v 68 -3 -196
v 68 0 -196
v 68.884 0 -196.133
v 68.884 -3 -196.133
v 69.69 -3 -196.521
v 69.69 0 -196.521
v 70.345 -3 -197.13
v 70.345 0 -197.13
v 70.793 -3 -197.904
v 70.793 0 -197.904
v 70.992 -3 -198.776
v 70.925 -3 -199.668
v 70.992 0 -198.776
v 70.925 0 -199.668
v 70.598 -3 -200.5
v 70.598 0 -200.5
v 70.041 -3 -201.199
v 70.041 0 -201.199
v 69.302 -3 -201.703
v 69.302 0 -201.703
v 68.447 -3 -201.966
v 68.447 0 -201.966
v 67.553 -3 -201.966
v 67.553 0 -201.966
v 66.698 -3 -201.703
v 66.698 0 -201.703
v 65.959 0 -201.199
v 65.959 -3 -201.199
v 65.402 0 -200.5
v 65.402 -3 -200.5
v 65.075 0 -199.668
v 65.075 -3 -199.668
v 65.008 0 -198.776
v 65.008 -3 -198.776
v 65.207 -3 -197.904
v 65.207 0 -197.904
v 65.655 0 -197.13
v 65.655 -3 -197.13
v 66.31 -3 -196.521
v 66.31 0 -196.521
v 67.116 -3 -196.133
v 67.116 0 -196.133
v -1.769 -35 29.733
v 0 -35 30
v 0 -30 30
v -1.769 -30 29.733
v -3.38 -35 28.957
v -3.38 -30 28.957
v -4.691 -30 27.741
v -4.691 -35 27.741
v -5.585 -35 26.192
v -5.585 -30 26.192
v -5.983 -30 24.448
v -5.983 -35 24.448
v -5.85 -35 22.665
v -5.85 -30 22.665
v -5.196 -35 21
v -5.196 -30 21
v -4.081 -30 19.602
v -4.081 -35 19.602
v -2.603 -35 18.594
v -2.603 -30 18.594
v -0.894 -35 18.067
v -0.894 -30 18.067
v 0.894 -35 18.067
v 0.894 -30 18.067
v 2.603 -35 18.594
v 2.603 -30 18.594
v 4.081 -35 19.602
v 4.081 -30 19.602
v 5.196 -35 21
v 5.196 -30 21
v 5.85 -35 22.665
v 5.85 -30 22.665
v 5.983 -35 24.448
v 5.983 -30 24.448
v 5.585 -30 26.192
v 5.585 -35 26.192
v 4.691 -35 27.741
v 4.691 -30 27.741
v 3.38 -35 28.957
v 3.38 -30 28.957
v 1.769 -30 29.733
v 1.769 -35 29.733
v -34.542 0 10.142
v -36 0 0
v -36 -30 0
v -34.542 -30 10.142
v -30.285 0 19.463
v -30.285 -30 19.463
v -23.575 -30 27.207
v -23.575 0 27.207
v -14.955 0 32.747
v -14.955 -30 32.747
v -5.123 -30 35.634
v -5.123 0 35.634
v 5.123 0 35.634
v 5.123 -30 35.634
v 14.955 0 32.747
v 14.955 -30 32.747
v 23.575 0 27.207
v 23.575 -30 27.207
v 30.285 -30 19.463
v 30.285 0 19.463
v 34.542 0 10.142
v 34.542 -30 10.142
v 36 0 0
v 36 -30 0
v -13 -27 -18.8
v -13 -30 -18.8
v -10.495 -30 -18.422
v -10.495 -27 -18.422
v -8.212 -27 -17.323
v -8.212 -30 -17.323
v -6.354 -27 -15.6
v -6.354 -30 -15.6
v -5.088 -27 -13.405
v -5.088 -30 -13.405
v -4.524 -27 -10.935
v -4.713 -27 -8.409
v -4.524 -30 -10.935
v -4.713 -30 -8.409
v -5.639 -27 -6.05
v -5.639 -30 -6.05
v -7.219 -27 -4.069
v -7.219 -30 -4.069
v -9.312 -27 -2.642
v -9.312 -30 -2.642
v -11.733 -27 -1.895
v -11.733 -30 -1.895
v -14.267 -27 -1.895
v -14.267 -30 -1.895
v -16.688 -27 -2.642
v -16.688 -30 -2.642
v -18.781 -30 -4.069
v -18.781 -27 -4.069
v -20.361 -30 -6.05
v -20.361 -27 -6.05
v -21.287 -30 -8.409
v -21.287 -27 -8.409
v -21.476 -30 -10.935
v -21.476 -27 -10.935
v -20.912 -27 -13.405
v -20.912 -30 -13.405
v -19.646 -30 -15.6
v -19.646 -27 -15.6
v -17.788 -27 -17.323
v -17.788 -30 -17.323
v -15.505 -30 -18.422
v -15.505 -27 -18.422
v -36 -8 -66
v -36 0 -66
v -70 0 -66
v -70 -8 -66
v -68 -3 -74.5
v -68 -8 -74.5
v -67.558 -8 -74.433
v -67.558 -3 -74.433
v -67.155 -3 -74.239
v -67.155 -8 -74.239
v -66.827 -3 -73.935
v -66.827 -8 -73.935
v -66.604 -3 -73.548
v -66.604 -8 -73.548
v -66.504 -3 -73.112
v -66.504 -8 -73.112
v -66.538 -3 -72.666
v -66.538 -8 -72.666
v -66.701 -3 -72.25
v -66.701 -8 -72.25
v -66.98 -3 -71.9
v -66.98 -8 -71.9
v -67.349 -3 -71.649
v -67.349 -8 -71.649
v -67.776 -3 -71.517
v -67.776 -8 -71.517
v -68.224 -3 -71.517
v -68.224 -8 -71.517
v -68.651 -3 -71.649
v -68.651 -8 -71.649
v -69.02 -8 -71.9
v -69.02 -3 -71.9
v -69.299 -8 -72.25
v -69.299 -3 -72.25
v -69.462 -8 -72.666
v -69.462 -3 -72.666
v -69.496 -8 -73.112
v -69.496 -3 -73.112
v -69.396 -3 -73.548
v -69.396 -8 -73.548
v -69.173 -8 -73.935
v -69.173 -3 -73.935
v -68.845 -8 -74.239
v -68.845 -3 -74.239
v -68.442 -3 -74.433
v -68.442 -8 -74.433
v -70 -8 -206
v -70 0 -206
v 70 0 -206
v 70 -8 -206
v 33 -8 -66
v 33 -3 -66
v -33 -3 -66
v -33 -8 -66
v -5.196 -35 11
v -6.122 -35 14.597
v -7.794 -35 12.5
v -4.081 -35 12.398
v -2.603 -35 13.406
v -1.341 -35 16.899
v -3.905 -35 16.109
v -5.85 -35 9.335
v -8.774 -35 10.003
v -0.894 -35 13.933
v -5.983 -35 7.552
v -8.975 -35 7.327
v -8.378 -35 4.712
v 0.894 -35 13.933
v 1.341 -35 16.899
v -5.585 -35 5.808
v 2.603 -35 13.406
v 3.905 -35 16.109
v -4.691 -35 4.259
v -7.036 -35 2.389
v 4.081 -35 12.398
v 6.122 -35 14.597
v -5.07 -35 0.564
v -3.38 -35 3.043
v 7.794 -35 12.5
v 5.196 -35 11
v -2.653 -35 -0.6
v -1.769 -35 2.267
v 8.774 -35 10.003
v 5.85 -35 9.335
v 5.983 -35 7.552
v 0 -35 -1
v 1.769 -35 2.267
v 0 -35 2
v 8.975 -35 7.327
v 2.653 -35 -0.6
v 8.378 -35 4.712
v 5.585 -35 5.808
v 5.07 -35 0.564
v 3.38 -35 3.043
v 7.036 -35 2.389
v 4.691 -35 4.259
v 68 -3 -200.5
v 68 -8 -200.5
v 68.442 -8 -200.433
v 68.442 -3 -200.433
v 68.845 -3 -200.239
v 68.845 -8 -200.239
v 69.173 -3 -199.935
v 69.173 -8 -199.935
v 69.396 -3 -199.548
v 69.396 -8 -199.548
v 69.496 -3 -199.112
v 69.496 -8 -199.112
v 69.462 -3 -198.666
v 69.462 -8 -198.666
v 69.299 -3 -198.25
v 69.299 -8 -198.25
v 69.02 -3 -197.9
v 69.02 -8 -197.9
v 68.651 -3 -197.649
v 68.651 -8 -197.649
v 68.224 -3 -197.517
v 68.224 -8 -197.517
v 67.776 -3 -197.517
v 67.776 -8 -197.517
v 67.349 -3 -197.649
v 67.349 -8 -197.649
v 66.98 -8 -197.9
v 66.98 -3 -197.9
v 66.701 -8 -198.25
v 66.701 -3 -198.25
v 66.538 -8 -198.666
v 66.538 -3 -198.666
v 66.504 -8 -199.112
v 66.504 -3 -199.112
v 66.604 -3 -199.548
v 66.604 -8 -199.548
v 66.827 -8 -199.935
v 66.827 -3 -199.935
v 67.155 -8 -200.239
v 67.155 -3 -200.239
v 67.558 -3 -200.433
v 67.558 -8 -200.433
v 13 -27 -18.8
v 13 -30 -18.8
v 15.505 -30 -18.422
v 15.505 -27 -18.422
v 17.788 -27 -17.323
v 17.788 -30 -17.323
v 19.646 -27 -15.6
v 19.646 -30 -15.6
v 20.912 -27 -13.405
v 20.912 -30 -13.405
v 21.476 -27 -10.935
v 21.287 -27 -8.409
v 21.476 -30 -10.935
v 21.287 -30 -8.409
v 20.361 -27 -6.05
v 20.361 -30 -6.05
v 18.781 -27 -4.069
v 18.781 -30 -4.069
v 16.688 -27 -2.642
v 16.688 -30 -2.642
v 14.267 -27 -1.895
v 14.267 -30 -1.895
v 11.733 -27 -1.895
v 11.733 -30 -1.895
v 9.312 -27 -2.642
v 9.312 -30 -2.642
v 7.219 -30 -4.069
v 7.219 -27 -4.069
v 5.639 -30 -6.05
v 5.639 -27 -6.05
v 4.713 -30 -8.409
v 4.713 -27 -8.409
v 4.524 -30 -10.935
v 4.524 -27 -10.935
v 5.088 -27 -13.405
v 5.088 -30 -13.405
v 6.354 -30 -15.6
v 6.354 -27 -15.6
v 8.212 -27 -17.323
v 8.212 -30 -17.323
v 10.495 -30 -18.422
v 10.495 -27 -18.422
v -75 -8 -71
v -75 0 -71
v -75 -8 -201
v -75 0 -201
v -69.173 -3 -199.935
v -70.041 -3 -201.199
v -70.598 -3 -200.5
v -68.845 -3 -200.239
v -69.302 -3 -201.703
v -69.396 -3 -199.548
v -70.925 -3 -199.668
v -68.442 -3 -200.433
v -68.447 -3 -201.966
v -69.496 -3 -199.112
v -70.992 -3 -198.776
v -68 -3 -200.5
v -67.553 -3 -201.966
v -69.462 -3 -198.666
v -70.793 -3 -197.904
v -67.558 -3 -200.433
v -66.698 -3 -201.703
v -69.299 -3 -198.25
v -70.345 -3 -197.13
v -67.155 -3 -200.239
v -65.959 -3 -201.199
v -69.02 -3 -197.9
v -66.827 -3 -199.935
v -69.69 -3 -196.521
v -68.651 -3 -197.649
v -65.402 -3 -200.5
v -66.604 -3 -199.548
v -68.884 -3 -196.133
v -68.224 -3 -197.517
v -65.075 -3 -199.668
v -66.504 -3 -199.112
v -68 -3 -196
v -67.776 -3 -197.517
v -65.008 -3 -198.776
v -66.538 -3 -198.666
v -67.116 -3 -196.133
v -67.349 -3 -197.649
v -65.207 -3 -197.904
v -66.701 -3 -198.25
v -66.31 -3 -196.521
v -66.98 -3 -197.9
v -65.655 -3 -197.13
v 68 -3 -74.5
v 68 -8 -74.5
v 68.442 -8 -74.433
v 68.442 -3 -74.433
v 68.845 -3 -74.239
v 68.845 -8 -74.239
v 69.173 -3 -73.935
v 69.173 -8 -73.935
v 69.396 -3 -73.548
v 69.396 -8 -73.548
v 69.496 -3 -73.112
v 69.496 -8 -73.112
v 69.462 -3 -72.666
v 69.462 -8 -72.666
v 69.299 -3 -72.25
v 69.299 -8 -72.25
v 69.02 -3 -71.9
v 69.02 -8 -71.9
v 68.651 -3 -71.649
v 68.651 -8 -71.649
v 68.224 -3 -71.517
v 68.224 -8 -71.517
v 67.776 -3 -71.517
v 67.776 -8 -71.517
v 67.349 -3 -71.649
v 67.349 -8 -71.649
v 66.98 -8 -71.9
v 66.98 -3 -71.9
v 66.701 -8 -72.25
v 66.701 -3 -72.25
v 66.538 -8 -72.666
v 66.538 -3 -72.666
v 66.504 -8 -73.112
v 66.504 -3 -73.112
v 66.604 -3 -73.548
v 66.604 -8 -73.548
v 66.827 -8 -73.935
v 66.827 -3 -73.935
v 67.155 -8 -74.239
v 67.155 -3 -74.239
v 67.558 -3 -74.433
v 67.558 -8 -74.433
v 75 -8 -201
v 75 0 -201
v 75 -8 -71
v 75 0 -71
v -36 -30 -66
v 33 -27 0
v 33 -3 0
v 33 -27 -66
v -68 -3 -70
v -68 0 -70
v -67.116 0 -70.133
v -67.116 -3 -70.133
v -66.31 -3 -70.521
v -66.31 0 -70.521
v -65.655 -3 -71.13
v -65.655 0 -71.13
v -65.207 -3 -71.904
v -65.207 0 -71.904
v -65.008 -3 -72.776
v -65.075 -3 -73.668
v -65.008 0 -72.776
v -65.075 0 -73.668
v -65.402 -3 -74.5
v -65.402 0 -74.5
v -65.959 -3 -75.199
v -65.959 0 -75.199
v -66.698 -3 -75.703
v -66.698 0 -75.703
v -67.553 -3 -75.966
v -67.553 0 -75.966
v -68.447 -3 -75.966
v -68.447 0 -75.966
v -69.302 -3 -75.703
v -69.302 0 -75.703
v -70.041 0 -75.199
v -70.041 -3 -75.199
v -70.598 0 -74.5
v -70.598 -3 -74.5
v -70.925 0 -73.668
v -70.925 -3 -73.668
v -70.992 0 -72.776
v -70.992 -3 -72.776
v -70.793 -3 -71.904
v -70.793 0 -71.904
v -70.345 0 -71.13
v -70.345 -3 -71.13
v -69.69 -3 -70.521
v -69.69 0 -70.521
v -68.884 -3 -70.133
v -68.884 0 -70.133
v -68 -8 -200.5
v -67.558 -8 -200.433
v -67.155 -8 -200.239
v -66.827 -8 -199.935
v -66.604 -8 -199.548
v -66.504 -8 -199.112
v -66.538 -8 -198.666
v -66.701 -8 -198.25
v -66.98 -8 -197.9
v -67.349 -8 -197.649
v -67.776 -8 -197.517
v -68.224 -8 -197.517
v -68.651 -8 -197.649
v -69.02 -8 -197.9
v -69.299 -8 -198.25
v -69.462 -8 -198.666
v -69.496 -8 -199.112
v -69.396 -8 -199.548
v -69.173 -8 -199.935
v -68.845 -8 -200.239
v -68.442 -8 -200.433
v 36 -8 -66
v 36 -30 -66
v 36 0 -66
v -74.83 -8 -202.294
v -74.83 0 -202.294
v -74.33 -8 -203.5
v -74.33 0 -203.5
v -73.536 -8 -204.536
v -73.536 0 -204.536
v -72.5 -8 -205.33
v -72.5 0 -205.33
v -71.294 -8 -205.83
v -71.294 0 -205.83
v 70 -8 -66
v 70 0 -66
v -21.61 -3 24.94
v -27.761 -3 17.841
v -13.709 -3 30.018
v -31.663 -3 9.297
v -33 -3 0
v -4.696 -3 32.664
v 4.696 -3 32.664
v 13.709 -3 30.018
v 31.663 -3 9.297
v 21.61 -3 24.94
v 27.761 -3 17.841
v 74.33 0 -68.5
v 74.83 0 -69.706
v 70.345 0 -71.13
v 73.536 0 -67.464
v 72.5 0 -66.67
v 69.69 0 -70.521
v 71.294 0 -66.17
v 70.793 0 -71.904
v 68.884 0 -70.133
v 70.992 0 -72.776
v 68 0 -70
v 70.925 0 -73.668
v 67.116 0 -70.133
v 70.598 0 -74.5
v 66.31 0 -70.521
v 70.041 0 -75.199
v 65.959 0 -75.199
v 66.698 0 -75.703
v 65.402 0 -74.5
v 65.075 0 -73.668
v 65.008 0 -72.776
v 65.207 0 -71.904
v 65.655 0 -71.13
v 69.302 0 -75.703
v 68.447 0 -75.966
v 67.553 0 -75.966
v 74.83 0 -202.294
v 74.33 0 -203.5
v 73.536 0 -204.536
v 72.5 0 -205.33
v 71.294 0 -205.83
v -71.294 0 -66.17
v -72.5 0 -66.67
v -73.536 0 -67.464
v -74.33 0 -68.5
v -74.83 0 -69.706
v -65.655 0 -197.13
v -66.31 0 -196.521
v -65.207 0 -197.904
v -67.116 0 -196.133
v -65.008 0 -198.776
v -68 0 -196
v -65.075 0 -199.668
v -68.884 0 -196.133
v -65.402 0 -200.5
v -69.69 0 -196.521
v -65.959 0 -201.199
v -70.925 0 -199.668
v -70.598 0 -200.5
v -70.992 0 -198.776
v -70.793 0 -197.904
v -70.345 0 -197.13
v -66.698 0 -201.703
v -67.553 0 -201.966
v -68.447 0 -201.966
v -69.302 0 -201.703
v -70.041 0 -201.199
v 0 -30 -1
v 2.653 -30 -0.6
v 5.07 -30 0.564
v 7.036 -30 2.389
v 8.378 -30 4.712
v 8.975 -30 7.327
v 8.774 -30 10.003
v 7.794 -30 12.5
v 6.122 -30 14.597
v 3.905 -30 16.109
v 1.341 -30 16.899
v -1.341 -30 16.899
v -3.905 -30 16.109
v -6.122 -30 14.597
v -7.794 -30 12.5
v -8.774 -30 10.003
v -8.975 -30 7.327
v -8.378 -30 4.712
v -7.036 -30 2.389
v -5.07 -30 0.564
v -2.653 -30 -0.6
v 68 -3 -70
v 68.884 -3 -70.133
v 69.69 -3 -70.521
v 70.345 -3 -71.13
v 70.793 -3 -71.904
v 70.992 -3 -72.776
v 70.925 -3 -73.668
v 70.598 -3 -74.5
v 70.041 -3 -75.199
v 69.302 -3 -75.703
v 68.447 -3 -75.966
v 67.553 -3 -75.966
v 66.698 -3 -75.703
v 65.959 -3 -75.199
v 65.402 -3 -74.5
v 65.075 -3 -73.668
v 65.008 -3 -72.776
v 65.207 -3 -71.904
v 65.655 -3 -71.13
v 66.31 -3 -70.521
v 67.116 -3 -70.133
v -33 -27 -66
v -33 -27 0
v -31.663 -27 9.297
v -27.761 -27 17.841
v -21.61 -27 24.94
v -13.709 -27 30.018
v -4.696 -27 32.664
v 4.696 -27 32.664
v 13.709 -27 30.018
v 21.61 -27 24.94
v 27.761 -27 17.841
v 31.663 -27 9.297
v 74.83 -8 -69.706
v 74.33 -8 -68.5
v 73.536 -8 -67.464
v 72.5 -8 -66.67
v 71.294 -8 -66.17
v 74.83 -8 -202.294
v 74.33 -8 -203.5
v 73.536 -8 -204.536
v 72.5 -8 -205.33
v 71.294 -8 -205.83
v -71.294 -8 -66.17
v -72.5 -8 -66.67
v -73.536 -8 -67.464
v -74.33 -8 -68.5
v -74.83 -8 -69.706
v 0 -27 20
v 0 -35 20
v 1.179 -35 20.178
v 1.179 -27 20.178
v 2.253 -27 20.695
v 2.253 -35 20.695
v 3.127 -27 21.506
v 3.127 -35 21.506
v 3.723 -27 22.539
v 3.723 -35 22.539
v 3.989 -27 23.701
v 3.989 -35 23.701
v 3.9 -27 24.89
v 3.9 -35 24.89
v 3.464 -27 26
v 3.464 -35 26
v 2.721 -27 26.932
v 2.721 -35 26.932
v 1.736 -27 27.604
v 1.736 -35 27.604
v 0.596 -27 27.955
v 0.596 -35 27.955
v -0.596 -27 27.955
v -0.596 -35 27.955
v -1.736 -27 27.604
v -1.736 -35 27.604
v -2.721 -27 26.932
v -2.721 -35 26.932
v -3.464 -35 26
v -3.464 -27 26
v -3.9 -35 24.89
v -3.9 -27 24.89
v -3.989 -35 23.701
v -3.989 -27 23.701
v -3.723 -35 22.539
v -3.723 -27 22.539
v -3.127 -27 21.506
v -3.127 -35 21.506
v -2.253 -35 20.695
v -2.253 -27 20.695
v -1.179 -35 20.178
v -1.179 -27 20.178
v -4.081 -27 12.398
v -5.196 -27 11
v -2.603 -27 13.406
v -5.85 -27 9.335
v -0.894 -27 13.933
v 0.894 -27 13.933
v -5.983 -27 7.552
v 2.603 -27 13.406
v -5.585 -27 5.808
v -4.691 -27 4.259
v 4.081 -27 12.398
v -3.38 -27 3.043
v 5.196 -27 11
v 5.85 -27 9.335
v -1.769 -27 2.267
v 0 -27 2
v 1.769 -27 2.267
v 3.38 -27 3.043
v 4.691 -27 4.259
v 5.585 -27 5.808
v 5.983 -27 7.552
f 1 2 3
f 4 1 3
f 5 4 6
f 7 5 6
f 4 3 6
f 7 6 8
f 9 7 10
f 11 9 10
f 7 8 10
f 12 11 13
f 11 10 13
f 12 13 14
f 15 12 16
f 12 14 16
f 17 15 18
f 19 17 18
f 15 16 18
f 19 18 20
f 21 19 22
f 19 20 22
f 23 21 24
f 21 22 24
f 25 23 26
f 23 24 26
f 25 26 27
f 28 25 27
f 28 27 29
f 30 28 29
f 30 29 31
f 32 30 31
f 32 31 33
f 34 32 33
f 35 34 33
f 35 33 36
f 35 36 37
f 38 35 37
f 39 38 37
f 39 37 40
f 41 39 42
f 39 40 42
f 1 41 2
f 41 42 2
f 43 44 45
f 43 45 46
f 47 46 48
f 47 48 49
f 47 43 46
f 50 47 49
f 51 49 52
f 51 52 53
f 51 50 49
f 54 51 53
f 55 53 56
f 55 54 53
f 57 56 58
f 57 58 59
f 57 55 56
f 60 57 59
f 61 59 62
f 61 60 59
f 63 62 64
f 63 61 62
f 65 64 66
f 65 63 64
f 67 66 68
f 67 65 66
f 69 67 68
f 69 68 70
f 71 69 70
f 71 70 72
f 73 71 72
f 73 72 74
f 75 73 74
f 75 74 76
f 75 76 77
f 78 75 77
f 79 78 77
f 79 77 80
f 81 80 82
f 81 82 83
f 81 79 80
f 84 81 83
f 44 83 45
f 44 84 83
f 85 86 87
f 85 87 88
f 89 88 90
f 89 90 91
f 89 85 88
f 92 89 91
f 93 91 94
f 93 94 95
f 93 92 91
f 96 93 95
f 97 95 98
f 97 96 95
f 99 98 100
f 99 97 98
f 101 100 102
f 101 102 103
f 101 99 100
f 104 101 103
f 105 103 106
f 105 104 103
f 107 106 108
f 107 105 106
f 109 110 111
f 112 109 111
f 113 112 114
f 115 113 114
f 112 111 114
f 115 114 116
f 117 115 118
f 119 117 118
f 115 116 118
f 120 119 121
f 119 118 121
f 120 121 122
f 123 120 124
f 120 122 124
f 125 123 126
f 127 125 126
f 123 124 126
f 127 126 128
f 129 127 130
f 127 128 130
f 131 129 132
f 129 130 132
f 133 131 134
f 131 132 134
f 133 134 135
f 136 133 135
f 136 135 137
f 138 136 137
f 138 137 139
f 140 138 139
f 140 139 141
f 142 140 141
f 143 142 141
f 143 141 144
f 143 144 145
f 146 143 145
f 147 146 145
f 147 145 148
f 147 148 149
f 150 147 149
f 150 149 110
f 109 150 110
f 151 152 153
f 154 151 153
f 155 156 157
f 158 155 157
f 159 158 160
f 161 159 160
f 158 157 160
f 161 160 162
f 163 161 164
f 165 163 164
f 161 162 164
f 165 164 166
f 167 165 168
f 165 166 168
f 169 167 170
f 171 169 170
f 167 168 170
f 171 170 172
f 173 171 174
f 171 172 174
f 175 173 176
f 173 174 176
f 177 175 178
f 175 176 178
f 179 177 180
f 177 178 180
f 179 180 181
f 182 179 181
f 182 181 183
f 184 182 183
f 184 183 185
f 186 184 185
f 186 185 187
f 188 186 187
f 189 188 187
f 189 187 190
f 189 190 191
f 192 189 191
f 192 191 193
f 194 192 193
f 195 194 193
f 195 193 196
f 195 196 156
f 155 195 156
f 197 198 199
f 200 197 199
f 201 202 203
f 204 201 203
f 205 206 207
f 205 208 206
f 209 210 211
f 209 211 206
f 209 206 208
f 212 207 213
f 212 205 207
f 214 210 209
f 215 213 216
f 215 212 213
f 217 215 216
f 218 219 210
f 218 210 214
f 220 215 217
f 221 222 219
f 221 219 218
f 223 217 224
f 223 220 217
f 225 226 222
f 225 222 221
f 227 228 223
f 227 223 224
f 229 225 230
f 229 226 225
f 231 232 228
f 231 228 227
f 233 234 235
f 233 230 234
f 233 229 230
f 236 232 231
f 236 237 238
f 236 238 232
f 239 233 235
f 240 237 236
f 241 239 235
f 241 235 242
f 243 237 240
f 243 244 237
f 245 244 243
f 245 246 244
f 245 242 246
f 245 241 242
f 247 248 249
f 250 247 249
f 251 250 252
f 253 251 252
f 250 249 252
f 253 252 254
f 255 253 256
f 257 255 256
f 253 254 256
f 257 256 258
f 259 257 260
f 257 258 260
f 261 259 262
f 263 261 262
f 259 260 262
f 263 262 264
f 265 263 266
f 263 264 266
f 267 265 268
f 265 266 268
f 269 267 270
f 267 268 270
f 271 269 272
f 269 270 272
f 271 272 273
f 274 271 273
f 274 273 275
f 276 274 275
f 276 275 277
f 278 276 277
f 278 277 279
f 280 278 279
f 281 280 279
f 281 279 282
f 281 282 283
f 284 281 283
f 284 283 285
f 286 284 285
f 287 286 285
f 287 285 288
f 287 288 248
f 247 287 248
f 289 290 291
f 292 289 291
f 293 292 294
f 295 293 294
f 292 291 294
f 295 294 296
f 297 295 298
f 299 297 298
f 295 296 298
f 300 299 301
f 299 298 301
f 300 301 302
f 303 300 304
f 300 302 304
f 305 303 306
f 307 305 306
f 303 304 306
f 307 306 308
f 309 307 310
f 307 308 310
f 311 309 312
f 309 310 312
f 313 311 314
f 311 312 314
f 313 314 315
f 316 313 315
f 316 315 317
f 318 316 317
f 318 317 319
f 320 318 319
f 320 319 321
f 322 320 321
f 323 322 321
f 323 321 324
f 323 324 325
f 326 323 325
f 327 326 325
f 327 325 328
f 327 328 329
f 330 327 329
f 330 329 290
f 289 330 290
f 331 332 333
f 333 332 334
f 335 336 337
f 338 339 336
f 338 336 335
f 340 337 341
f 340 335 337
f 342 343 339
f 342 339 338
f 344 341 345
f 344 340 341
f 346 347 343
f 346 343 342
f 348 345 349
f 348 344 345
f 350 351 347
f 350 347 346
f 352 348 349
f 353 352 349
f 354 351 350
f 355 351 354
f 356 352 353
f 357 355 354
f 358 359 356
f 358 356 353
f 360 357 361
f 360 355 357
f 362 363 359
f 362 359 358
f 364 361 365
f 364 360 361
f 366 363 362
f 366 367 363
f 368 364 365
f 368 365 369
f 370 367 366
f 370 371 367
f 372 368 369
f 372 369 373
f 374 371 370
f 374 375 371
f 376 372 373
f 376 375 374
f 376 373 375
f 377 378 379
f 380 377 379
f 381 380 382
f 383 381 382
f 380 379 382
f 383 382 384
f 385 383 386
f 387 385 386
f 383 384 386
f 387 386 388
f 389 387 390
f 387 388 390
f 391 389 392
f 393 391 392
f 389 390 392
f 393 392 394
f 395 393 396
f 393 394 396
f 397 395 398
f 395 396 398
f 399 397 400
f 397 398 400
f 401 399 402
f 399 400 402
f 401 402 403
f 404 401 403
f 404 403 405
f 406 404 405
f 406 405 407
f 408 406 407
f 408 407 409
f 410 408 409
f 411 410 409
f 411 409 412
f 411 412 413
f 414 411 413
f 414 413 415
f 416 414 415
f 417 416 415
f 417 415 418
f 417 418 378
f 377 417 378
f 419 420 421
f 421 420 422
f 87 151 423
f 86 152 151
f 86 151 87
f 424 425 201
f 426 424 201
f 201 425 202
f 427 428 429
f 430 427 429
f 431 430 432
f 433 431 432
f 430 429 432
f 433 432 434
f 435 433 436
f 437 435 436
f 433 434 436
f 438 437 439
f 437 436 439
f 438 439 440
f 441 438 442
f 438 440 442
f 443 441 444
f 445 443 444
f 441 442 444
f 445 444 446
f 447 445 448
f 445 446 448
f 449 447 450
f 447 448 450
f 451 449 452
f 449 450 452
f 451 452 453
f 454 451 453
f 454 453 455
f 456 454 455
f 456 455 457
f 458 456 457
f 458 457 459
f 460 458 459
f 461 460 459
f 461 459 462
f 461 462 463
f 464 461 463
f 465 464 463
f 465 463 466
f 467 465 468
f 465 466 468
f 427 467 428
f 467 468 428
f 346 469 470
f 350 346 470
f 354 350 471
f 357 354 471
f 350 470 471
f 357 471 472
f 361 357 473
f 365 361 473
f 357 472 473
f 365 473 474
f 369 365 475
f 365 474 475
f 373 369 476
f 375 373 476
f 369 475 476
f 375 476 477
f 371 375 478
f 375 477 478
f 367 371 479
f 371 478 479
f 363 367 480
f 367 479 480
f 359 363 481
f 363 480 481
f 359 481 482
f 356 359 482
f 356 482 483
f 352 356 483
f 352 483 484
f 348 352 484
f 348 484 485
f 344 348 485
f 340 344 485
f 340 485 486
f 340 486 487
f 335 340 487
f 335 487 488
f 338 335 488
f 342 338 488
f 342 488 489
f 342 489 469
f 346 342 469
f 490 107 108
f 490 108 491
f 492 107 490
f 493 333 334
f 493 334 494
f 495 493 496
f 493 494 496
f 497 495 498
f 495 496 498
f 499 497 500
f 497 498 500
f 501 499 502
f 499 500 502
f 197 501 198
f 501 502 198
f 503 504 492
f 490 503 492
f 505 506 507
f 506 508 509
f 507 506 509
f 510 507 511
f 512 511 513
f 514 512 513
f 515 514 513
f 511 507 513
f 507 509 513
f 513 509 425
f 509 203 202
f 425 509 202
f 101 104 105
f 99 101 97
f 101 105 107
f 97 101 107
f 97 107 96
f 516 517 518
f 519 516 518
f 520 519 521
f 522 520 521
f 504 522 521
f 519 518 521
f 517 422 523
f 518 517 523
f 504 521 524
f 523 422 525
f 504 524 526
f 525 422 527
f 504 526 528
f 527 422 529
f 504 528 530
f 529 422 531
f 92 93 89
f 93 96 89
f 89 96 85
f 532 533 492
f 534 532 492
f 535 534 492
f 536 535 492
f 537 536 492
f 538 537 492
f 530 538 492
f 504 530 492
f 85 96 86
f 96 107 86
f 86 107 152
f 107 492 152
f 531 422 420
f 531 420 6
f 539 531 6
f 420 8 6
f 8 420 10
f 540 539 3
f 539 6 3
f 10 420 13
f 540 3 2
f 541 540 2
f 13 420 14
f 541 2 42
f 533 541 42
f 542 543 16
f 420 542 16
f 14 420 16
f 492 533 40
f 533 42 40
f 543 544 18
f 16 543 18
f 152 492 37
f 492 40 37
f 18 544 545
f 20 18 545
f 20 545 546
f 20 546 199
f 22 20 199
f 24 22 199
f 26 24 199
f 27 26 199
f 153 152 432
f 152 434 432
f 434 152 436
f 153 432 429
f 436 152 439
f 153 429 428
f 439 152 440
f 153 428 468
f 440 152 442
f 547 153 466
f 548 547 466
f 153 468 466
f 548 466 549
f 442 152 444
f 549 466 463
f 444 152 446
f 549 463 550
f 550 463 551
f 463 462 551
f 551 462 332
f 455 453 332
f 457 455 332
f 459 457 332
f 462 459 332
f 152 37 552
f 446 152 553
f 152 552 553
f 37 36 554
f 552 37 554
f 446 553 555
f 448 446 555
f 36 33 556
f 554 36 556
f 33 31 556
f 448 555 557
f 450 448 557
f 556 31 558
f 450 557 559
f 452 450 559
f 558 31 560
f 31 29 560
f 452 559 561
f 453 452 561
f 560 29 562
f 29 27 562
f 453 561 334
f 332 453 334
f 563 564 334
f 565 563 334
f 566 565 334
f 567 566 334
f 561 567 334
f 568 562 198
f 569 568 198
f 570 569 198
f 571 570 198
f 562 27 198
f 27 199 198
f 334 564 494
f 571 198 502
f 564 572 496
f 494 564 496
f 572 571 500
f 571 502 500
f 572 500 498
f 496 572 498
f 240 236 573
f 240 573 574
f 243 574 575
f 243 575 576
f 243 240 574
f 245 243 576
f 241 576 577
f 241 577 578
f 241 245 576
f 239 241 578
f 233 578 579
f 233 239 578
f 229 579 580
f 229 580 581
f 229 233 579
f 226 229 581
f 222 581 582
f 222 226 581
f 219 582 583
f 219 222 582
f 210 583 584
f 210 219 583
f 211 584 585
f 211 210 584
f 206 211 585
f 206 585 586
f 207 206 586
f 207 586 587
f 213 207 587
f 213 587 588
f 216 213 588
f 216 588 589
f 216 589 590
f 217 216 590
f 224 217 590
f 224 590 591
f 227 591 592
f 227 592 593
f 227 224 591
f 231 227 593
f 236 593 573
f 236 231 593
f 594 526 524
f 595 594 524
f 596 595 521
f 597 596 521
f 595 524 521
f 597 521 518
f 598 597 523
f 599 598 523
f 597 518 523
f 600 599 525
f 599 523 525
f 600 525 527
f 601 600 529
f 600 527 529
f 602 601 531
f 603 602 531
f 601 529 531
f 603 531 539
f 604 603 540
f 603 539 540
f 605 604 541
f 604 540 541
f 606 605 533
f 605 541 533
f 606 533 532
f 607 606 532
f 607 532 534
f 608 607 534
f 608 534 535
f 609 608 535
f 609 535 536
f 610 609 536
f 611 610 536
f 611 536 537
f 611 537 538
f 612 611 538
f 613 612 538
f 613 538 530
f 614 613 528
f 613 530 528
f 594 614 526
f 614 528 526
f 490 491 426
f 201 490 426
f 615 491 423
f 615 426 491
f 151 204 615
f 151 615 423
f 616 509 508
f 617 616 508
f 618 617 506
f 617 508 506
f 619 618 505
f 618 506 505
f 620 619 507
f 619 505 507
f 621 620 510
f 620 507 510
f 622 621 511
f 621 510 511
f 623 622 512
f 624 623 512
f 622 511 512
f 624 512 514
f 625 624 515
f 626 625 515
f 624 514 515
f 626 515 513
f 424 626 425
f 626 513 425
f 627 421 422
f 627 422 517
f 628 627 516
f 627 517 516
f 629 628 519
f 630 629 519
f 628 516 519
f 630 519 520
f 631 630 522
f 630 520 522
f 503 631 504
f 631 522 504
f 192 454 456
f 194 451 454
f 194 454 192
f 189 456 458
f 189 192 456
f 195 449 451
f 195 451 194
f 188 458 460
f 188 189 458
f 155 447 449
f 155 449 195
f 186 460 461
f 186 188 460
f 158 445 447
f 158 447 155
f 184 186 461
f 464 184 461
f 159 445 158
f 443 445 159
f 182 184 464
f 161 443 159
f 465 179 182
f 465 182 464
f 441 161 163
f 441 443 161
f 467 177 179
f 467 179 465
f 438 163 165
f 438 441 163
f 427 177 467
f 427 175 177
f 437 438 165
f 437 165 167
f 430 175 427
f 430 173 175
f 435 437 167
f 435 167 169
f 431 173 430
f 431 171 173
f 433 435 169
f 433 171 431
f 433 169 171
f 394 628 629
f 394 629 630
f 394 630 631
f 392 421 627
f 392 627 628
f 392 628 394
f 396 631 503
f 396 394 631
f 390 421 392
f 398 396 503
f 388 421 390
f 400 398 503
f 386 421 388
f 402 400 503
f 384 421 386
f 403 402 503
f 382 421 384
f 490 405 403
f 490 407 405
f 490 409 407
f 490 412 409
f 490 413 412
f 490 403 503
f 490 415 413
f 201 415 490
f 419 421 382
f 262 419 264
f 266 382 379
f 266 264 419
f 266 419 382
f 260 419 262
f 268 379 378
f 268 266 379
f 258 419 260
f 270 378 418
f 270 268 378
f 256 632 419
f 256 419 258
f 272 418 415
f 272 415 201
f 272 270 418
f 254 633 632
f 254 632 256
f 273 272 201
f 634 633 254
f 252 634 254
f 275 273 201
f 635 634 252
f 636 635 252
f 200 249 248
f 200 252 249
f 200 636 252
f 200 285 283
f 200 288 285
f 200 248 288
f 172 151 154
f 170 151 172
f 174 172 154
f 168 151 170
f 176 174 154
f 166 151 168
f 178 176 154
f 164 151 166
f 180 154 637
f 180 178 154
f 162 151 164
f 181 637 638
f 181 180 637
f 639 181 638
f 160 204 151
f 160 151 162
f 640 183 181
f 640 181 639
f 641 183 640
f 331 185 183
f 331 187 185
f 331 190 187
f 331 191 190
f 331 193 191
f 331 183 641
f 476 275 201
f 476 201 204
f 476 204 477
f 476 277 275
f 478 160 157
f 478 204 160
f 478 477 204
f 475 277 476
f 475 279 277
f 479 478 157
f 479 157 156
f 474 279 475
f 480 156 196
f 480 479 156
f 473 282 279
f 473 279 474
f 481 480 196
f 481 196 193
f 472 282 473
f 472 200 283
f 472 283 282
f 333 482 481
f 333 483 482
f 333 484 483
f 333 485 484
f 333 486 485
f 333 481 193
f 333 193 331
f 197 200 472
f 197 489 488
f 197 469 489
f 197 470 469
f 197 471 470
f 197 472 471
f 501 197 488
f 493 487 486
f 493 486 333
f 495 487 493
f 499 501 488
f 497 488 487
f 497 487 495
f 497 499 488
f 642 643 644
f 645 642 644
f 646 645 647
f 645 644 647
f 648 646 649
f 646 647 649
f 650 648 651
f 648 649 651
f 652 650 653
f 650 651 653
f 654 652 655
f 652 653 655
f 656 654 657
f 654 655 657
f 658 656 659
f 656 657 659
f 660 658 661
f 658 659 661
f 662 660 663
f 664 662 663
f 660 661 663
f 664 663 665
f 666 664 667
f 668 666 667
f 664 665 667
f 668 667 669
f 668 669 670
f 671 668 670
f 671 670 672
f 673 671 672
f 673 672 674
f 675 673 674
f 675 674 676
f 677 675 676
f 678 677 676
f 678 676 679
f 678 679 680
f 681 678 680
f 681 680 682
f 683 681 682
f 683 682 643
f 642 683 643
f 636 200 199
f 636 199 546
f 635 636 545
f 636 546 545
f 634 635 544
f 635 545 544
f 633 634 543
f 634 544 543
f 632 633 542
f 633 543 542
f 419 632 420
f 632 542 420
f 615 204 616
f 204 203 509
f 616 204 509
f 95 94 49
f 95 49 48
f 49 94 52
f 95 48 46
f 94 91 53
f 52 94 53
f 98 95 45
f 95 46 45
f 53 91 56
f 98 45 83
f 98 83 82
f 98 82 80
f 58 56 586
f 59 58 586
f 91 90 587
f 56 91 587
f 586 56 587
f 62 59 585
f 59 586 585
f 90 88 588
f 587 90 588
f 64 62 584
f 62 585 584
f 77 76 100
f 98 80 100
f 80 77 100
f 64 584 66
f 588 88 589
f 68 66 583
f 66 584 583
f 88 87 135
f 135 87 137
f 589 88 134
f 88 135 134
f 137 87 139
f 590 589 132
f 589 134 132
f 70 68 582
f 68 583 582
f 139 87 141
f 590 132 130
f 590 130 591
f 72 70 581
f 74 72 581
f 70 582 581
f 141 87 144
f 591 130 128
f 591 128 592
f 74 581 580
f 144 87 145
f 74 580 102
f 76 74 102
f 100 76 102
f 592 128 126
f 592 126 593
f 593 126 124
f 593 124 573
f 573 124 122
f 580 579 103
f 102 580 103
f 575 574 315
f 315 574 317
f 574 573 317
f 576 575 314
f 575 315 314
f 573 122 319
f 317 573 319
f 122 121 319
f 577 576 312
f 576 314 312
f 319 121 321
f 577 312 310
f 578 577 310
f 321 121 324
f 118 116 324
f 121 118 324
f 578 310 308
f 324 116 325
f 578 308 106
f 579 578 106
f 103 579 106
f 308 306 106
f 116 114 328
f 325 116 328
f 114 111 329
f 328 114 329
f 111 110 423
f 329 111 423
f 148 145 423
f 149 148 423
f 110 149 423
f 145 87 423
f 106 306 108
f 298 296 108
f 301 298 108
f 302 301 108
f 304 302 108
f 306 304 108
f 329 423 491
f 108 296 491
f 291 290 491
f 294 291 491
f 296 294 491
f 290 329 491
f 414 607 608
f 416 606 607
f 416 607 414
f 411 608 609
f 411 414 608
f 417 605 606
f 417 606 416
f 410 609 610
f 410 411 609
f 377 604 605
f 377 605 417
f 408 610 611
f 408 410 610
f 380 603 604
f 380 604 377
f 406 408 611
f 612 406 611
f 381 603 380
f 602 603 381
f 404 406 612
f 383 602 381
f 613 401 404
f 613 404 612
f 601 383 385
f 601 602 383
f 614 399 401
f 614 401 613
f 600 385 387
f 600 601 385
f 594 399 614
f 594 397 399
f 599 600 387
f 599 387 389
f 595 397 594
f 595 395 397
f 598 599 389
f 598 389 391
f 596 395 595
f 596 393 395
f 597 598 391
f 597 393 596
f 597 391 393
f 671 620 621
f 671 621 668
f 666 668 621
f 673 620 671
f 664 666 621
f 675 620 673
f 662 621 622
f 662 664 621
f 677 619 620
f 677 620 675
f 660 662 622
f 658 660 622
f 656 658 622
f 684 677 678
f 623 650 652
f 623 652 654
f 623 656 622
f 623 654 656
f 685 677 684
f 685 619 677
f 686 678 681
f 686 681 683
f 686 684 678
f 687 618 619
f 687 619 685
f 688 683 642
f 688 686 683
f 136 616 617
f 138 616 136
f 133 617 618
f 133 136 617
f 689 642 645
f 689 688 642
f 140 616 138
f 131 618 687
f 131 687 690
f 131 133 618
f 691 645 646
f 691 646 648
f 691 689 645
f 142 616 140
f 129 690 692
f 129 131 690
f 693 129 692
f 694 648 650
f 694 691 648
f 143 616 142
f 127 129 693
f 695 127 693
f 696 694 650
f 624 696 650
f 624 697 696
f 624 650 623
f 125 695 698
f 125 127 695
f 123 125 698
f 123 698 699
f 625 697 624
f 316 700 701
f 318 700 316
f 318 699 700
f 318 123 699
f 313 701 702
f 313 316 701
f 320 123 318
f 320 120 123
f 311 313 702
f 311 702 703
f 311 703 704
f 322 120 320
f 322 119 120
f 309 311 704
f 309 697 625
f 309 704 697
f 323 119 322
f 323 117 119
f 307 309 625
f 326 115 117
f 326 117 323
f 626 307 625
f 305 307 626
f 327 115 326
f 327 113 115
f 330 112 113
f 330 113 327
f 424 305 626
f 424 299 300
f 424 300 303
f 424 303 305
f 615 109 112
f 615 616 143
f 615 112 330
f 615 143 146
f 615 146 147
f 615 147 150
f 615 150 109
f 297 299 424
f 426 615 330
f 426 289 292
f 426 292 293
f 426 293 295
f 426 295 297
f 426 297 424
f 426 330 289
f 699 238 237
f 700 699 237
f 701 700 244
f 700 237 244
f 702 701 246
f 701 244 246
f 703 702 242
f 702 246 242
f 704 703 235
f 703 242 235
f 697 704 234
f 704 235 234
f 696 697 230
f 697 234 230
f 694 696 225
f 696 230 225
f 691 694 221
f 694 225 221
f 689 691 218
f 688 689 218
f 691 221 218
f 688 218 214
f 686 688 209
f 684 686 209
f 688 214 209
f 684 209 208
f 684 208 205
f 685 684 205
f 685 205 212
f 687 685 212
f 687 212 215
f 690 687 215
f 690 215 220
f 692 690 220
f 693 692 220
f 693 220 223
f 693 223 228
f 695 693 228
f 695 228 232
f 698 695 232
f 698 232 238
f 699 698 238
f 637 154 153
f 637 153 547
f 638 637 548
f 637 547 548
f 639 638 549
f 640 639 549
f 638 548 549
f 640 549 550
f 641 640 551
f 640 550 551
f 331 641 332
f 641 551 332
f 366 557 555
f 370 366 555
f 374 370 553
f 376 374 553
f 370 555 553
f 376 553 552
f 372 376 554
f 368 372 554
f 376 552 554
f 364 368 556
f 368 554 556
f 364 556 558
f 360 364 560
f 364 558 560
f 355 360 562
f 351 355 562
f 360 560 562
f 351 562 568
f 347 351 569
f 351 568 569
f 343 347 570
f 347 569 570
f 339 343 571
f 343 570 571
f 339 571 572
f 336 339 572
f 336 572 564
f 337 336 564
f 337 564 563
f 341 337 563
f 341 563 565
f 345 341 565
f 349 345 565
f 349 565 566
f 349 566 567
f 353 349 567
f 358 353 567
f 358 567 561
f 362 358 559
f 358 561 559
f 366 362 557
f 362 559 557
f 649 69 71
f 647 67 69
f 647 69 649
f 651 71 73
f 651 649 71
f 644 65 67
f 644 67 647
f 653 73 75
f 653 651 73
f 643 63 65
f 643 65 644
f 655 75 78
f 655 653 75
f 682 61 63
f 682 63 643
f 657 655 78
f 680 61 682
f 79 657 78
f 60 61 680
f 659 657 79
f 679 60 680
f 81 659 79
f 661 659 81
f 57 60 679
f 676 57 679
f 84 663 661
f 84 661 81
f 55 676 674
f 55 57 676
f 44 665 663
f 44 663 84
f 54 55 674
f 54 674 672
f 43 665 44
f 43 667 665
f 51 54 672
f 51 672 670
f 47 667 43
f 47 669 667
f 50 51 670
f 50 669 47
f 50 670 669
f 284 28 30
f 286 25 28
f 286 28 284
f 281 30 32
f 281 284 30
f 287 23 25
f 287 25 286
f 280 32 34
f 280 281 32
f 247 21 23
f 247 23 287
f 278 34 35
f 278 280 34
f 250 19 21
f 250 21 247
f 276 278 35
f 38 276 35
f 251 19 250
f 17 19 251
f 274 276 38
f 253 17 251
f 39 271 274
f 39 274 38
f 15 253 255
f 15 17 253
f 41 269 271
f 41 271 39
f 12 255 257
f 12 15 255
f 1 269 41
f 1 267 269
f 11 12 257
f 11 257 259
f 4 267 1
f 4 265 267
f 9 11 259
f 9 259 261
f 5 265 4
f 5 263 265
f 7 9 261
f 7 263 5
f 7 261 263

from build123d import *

# Parameters (mm, degrees)
BOSS_EXTRUDE1_DEPTH = 30
SHELL1_T            = -3
BOSS_EXTRUDE2_DEPTH = 8
SKETCH2_R           = 8.5
CUT_EXTRUDE1_DEPTH  = 6.5
SKETCH5_R           = 6
CUT_EXTRUDE4_DEPTH  = 13
BOSS_EXTRUDE3_START = 5
SKETCH6_R           = 9
SKETCH6_R_2         = 6
BOSS_EXTRUDE3_DEPTH = 5
SKETCH7_R           = 4
CUT_EXTRUDE5_DEPTH  = 7
BOSS_EXTRUDE4_START = 5
SKETCH7_3_R         = 6
SKETCH7_3_R_2       = 4
BOSS_EXTRUDE4_DEPTH = 5
SKETCH8_R           = 1.5
CUT_EXTRUDE6_DEPTH  = 221.884585248
SKETCH9_R           = 3
CUT_EXTRUDE7_DEPTH  = 3


with BuildPart() as part:
    # Sketch1 → Boss-Extrude1 (new body)
    with BuildSketch(Plane(origin=(0, 0, 0), x_dir=(1, 0, 0), z_dir=(0, 1, 0))):
        with BuildLine():
            ThreePointArc((-36, 0), (0, -36), (36, 0))
            Line((36, 0), (36, 66))
            Line((36, 66), (-36, 66))
            Line((-36, 66), (-36, 0))
        make_face()
    extrude(amount=-BOSS_EXTRUDE1_DEPTH)

    # Shell1
    shell1_openings = [part.faces().sort_by_distance(p)[0] for p in [
        (0, -15, -66),
    ]]
    offset(amount=SHELL1_T, openings=shell1_openings, kind=Kind.INTERSECTION)

    # Sketch1<3> → Boss-Extrude2 (add)
    with BuildSketch(Plane(origin=(0, 0, 0), x_dir=(1, 0, 0), z_dir=(0, 1, 0))):
        with BuildLine():
            Line((-36, 66), (36, 66))
            Line((36, 66), (70, 66))
            ThreePointArc((70, 66), (73.535533906, 67.464466094), (75, 71))
            Line((75, 71), (75, 201))
            ThreePointArc((75, 201), (73.535533906, 204.535533906), (70, 206))
            Line((70, 206), (-70, 206))
            ThreePointArc((-70, 206), (-73.535533906, 204.535533906), (-75, 201))
            Line((-75, 201), (-75, 71))
            ThreePointArc((-75, 71), (-73.535533906, 67.464466094), (-70, 66))
            Line((-70, 66), (-36, 66))
        make_face()
    extrude(amount=-BOSS_EXTRUDE2_DEPTH)

    # Sketch2 → Cut-Extrude1 (cut)
    with BuildSketch(Plane.XZ.offset(30)):
        with Locations((13, -10.3)):
            Circle(SKETCH2_R)
        with Locations((-13, -10.3)):
            Circle(SKETCH2_R)
    extrude(amount=-CUT_EXTRUDE1_DEPTH, mode=Mode.SUBTRACT)

    # Sketch5 → Cut-Extrude4 (cut)
    with BuildSketch(Plane.XZ.offset(30)):
        with Locations((0, 8)):
            Circle(SKETCH5_R)
    extrude(amount=-CUT_EXTRUDE4_DEPTH, mode=Mode.SUBTRACT)

    # Sketch6 → Boss-Extrude3 (add)
    with BuildSketch(Plane.XZ.offset(30).offset(BOSS_EXTRUDE3_START)):
        with Locations((0, 8)):
            Circle(SKETCH6_R)
        with Locations((0, 8)):
            Circle(SKETCH6_R_2, mode=Mode.SUBTRACT)
    extrude(amount=-BOSS_EXTRUDE3_DEPTH)

    # Sketch7 → Cut-Extrude5 (cut)
    with BuildSketch(Plane.XZ.offset(30)):
        with Locations((0, 24)):
            Circle(SKETCH7_R)
    extrude(amount=-CUT_EXTRUDE5_DEPTH, mode=Mode.SUBTRACT)

    # Sketch7<3> → Boss-Extrude4 (add)
    with BuildSketch(Plane.XZ.offset(30).offset(BOSS_EXTRUDE4_START)):
        with Locations((0, 24)):
            Circle(SKETCH7_3_R)
        with Locations((0, 24)):
            Circle(SKETCH7_3_R_2, mode=Mode.SUBTRACT)
    extrude(amount=-BOSS_EXTRUDE4_DEPTH)

    # Sketch8 → Cut-Extrude6 (cut, through all)
    with BuildSketch(Plane.XZ.offset(8)):
        with Locations((68, -73)):
            Circle(SKETCH8_R)
        with Locations((68, -199)):
            Circle(SKETCH8_R)
        with Locations((-68, -199)):
            Circle(SKETCH8_R)
        with Locations((-68, -73)):
            Circle(SKETCH8_R)
    extrude(amount=-CUT_EXTRUDE6_DEPTH, mode=Mode.SUBTRACT)

    # Sketch9 → Cut-Extrude7 (cut)
    with BuildSketch(Plane(origin=(0, 0, 0), x_dir=(1, 0, 0), z_dir=(0, 1, 0))):
        with Locations((-68, 73)):
            Circle(SKETCH9_R)
        with Locations((-68, 199)):
            Circle(SKETCH9_R)
        with Locations((68, 199)):
            Circle(SKETCH9_R)
        with Locations((68, 73)):
            Circle(SKETCH9_R)
    extrude(amount=-CUT_EXTRUDE7_DEPTH, mode=Mode.SUBTRACT)


solid = part.part
